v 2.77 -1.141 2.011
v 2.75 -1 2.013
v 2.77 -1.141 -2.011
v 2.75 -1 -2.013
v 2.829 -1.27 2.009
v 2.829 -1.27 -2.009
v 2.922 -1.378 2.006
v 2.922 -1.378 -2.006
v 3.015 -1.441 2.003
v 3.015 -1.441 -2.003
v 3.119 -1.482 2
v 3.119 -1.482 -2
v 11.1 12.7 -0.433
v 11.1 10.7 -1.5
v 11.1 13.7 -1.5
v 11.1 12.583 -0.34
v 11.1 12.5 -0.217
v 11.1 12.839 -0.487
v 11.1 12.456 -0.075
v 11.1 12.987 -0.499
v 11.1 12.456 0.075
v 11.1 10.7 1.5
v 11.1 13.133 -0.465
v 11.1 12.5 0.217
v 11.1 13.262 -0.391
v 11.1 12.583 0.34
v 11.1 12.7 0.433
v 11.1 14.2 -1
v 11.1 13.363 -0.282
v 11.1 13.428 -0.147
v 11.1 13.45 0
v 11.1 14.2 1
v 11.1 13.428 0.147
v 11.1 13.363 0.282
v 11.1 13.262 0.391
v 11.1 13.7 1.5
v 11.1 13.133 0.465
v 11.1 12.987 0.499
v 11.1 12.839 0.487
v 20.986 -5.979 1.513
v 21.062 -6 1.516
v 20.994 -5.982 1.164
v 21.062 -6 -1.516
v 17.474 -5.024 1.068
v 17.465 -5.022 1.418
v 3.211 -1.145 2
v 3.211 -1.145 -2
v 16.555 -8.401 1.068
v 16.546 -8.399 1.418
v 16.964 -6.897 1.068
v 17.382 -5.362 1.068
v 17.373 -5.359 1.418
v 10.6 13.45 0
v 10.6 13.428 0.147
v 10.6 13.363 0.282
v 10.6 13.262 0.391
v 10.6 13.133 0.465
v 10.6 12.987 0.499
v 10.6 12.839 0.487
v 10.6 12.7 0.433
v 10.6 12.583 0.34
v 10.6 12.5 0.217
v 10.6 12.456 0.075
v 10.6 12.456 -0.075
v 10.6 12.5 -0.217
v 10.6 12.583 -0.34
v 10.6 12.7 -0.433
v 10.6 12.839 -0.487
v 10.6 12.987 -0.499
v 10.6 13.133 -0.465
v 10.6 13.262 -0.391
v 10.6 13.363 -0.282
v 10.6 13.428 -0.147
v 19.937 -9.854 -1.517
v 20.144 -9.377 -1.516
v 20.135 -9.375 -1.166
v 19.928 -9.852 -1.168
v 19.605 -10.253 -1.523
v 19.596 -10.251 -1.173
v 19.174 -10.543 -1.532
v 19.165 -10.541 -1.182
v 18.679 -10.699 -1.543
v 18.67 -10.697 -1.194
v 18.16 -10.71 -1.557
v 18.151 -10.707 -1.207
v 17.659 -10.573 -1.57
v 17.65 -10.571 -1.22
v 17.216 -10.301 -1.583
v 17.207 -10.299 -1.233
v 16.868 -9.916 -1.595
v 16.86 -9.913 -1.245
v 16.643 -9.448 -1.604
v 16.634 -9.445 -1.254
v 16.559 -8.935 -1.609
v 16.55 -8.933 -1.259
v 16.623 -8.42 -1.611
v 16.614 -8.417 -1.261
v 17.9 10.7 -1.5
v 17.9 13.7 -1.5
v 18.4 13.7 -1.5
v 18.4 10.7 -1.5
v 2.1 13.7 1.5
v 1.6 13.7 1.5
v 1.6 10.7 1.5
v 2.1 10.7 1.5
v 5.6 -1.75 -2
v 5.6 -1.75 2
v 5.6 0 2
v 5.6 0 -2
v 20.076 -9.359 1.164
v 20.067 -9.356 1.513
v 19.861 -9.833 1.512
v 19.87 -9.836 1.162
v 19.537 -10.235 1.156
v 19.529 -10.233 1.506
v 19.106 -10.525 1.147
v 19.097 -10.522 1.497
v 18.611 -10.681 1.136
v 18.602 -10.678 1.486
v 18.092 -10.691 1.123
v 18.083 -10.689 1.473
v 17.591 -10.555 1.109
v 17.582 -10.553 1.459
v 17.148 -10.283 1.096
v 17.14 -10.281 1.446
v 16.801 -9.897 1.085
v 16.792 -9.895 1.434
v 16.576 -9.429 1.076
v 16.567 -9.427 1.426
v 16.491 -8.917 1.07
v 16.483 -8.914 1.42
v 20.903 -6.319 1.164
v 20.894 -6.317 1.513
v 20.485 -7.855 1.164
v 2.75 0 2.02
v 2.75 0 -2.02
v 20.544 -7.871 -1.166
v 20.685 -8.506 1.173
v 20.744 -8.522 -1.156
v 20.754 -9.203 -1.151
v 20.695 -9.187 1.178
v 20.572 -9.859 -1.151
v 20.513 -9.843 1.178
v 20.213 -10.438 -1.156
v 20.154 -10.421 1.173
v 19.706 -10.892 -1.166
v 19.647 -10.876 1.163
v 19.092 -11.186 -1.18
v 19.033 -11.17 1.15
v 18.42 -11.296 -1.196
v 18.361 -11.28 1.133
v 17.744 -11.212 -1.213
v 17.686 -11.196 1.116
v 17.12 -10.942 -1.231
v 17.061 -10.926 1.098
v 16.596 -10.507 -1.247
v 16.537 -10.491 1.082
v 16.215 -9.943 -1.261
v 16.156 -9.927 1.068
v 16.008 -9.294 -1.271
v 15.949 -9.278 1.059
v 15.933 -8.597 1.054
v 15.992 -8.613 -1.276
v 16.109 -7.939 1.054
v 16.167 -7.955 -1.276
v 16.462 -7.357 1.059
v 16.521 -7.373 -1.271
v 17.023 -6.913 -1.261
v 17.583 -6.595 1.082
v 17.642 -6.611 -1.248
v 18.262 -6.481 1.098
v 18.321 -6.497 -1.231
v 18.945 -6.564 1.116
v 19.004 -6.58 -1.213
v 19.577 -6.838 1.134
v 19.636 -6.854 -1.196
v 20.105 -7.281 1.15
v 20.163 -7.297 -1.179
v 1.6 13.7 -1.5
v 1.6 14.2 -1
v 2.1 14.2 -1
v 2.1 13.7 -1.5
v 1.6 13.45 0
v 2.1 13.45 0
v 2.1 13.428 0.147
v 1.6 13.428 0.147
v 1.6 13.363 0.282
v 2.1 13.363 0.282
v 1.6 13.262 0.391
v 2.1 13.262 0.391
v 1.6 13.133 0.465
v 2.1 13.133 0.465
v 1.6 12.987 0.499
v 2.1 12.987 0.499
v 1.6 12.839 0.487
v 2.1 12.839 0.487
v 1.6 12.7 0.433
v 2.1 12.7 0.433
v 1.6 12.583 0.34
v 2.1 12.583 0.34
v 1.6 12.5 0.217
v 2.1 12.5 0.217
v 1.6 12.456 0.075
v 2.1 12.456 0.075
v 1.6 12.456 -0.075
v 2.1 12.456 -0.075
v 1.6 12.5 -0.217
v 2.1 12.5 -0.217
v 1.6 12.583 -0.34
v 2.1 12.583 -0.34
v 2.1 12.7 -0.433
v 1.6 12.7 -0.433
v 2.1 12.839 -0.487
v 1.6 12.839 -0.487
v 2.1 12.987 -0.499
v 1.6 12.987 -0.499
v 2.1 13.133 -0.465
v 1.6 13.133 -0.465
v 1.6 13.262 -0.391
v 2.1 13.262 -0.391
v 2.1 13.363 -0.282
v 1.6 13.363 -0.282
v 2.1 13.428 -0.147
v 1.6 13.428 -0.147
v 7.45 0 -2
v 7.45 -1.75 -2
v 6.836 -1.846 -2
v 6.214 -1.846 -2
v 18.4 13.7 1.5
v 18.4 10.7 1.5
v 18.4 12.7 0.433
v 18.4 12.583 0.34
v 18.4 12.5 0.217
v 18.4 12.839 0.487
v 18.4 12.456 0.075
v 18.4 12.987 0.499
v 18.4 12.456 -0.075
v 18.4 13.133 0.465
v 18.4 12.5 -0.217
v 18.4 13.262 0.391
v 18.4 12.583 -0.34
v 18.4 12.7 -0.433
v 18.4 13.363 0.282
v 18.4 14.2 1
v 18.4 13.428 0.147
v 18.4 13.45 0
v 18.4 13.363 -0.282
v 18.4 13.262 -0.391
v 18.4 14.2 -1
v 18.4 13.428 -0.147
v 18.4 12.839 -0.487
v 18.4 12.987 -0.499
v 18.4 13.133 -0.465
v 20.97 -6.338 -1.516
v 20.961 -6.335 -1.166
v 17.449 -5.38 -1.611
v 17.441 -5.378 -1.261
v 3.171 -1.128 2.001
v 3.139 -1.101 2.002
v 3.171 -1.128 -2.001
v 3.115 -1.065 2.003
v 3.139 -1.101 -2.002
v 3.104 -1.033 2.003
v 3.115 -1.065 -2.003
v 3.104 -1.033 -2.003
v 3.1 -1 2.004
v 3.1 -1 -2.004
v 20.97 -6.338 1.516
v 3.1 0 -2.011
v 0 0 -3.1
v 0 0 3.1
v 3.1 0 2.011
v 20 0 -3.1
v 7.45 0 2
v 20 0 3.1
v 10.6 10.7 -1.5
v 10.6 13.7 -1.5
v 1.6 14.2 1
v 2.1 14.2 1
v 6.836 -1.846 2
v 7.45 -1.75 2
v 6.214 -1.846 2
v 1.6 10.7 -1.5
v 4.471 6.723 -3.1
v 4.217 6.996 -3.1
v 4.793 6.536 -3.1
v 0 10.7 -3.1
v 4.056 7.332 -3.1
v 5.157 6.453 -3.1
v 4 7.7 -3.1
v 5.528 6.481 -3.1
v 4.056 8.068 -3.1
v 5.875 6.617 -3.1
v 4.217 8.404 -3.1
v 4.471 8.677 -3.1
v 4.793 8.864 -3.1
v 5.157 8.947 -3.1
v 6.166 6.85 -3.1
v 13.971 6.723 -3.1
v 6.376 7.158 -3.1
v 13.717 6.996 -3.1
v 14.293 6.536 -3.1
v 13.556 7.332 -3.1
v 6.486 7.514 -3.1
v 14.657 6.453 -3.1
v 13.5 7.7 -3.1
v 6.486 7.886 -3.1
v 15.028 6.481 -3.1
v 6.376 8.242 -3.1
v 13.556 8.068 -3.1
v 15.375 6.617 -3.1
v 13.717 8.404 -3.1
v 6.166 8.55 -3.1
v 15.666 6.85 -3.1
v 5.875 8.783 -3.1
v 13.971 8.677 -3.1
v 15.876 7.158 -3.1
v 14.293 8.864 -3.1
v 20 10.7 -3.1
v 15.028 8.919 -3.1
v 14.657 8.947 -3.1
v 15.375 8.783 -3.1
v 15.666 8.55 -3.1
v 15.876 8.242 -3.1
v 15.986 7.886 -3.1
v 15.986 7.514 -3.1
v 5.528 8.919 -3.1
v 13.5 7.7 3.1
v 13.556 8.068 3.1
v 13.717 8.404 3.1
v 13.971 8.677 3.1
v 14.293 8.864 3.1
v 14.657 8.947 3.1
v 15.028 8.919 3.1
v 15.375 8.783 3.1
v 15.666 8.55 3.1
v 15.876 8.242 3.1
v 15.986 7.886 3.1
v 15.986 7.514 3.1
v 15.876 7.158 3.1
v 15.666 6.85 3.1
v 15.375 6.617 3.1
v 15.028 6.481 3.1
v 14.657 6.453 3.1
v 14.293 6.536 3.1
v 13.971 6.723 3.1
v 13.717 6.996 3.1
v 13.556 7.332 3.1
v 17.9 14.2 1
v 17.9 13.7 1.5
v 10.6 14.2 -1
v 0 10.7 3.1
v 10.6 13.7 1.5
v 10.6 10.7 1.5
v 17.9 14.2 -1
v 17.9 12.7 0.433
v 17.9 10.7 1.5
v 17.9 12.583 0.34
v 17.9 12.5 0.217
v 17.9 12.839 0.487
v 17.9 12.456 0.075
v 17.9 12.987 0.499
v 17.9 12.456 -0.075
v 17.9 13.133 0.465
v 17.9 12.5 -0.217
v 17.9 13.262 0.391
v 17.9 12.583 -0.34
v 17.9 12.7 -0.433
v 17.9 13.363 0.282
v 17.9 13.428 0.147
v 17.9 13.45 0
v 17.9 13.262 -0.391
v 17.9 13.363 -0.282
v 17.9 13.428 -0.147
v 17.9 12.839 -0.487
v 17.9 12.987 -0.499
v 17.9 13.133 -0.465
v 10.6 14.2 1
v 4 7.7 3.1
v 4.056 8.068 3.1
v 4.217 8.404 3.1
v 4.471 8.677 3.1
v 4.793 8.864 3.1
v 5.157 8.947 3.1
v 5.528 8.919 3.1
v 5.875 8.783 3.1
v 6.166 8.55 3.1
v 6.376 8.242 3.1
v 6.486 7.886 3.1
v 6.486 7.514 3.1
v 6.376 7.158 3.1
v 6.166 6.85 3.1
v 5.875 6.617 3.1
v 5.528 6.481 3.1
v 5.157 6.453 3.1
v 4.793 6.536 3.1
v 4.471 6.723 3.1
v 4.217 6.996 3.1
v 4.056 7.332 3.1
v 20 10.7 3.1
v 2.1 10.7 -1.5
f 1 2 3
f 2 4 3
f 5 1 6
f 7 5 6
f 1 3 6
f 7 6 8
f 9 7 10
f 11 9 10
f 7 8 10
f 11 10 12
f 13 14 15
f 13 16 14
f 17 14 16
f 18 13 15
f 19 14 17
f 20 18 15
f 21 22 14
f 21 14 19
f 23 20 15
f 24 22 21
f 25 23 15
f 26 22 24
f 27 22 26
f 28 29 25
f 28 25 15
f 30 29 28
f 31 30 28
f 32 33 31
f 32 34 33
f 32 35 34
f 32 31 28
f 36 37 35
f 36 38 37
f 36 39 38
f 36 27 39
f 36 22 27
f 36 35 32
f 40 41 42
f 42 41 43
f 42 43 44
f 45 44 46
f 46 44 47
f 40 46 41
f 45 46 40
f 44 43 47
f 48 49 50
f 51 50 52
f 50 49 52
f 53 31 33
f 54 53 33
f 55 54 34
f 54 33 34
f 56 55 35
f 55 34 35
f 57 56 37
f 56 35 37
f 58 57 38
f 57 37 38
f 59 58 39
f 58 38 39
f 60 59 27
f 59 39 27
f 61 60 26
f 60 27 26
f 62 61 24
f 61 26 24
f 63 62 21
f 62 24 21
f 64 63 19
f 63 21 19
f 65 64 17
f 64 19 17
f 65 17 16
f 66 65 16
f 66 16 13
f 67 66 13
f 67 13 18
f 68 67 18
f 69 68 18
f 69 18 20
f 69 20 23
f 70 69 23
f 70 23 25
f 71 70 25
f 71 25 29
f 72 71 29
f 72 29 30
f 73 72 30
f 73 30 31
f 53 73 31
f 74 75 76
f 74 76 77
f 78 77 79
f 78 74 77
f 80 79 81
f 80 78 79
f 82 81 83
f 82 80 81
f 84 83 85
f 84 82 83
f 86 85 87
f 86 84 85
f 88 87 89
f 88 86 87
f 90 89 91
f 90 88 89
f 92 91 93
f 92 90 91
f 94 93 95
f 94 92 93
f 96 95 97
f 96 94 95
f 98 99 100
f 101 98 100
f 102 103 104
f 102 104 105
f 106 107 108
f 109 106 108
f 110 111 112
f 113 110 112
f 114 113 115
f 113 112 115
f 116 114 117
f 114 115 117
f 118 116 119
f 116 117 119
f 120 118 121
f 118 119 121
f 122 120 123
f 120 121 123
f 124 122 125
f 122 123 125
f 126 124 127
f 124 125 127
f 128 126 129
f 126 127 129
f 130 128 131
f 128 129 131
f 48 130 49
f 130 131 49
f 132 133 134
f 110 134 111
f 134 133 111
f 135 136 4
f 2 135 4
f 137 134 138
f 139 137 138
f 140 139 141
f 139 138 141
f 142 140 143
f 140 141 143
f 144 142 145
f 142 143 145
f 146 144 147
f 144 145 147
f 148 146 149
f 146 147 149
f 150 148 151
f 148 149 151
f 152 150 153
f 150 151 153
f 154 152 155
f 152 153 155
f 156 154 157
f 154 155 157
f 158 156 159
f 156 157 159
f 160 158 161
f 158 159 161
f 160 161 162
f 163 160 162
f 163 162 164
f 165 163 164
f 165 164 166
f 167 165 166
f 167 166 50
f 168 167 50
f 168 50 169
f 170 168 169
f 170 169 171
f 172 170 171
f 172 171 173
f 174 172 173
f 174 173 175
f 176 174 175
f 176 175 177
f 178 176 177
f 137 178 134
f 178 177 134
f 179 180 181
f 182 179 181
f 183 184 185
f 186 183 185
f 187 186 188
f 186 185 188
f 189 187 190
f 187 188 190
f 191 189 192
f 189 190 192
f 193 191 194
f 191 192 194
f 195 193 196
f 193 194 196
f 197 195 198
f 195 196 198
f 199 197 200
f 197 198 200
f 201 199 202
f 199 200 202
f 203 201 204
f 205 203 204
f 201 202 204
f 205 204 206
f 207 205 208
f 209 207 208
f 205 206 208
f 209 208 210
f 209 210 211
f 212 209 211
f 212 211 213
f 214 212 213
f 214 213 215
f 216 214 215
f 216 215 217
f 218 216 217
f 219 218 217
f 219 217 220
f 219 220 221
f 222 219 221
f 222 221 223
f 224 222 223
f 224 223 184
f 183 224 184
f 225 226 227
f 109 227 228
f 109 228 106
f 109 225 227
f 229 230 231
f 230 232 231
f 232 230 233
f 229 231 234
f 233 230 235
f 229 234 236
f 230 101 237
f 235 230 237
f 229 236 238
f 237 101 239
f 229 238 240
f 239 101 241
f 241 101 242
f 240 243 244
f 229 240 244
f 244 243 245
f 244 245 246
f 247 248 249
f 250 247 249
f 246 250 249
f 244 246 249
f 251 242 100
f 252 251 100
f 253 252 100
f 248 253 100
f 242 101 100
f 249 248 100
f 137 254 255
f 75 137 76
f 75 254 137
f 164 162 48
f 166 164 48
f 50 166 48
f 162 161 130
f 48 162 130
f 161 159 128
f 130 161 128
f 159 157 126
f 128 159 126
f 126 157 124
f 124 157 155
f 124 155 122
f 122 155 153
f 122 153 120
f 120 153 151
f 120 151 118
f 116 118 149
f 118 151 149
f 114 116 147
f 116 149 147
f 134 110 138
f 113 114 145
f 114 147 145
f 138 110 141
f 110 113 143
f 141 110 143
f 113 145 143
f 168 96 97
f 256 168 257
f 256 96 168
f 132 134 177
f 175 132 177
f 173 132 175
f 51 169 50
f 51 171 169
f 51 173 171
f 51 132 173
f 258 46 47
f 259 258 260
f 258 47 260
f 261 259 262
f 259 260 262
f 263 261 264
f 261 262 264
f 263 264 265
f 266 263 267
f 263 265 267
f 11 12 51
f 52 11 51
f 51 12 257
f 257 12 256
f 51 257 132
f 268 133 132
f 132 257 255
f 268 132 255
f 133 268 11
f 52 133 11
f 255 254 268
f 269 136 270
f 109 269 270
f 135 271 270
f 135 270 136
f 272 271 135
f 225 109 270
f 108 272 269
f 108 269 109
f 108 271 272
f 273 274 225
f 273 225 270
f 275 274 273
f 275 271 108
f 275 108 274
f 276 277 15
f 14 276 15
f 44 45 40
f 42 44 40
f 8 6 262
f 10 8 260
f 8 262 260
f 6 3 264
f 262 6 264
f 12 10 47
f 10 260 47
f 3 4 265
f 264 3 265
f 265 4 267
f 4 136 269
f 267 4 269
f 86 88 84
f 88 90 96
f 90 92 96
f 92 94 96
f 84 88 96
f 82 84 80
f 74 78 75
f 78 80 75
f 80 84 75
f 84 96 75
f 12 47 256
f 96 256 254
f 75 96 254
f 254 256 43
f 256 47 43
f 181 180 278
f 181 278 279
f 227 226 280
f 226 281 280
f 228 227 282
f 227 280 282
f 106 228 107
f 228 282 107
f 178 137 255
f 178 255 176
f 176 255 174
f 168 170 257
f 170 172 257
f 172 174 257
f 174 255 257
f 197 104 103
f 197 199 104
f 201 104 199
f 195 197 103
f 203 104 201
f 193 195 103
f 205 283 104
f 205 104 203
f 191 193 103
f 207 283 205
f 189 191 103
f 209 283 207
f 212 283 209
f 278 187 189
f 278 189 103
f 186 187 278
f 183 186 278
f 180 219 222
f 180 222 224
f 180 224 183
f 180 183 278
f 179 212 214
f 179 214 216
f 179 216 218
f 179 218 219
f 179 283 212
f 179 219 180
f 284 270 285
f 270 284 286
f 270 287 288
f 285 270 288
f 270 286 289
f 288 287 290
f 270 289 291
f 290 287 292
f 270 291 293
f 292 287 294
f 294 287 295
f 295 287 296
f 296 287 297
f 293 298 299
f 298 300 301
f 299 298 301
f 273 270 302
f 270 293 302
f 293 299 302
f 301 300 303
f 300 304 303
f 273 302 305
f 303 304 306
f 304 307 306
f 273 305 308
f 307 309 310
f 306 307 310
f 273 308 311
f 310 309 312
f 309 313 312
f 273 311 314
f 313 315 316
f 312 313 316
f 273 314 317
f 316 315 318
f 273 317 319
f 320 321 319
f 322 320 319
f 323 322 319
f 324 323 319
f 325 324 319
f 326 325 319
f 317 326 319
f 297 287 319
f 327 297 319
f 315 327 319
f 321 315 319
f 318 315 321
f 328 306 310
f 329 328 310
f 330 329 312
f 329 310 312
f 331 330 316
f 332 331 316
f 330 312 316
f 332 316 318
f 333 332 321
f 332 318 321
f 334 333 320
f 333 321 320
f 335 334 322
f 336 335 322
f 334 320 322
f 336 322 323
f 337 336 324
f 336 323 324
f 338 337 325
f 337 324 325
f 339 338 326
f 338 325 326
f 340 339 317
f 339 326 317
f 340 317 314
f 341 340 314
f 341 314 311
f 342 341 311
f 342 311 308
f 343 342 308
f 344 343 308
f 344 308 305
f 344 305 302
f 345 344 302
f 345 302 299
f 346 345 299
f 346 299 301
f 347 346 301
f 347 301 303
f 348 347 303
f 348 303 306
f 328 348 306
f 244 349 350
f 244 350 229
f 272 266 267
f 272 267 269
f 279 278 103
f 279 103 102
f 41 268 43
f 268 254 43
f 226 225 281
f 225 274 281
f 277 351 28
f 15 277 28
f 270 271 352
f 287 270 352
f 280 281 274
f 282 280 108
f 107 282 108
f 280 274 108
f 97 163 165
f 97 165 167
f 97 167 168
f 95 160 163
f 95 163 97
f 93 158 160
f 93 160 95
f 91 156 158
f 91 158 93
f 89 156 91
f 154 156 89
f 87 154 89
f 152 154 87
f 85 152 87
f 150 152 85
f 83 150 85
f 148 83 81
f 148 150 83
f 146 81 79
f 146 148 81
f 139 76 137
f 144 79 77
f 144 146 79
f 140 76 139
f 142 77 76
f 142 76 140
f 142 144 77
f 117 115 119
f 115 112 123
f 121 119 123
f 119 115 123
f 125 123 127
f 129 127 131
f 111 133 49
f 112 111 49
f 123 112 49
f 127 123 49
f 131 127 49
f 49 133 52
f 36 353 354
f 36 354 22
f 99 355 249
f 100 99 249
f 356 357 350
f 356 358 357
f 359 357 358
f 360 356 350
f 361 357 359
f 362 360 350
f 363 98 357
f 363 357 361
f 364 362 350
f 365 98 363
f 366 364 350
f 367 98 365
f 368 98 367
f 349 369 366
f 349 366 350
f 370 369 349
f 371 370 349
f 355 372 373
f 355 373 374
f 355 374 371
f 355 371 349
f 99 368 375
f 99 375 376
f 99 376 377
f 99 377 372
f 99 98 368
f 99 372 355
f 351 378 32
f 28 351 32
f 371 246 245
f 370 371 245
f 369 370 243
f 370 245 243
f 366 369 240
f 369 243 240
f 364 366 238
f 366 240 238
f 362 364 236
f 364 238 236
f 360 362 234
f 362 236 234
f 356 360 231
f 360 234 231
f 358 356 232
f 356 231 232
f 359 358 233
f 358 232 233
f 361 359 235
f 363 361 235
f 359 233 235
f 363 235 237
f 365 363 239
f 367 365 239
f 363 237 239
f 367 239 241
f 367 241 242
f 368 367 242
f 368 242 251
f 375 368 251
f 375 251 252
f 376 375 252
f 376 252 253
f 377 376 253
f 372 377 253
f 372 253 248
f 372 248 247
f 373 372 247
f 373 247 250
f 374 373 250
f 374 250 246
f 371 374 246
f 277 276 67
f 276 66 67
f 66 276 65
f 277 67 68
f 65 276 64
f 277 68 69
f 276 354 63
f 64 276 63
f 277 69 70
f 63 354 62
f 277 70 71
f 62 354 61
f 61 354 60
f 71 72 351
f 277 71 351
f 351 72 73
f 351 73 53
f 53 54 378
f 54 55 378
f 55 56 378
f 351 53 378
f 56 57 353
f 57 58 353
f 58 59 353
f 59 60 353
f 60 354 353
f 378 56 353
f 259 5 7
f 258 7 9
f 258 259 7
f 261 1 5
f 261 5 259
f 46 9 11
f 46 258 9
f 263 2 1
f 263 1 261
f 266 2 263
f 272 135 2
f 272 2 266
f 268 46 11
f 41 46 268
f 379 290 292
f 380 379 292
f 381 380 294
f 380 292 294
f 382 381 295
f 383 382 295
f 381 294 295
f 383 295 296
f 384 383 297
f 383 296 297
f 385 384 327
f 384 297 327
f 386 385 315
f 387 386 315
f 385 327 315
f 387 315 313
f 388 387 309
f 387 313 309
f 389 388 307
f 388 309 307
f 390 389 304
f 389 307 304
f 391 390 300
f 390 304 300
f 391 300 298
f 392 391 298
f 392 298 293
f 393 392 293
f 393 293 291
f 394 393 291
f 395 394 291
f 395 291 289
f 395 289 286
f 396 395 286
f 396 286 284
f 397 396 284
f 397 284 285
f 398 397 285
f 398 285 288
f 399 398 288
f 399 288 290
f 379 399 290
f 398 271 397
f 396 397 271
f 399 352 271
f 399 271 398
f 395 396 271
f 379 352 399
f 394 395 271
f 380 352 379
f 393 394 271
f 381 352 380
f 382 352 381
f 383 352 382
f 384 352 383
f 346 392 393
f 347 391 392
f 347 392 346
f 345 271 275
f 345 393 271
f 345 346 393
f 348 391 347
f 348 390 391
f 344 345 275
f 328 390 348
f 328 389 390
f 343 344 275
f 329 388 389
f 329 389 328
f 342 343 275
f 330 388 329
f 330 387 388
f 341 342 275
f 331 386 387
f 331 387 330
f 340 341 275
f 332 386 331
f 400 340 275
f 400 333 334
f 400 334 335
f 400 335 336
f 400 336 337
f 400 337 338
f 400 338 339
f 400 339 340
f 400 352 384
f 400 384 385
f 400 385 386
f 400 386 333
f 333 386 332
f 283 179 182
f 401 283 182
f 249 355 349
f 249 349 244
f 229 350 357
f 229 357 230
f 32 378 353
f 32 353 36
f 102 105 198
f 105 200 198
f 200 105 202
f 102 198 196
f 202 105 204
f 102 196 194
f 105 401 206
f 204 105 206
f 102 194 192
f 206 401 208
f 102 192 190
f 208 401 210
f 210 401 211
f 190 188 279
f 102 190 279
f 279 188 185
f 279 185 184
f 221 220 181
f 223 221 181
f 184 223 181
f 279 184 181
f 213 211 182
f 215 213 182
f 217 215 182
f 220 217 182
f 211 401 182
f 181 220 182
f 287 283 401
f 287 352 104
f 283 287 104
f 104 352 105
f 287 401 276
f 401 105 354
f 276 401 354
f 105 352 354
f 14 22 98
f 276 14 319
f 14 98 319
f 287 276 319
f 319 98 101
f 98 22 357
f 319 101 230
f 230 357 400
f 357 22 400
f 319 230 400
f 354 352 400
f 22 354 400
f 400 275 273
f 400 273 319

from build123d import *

# Parameters (mm, degrees)
SKETCH1_W           = 20
SKETCH1_H           = 10.7
BOSS_EXTRUDE1_DEPTH = 3.1
SKETCH2_W           = 0.5
SKETCH2_H           = 3.5
BOSS_EXTRUDE2_DEPTH = 1.5
CHAMFER1_SIZE       = 0.5
CUT_EXTRUDE1_REACH  = 25.448
SKETCH3_R           = 0.5
SKETCH4_R           = 1.25
CUT_EXTRUDE2_DEPTH  = 26.299802371
BOSS_EXTRUDE3_DEPTH = 2
DRAFT10_ANGLE       = 1.5
BOSS_EXTRUDE4_DEPTH = 0.35
SKETCH8_R           = 2.4
BOSS_EXTRUDE5_DEPTH = 2.330082213


with BuildPart() as part:
    # Sketch1 → Boss-Extrude1 (new, symmetric)
    with BuildSketch(Plane.XY):
        with Locations((10, 5.35)):
            Rectangle(SKETCH1_W, SKETCH1_H)
    extrude(amount=BOSS_EXTRUDE1_DEPTH, both=True)

    # Sketch2 → Boss-Extrude2 (add, symmetric)
    with BuildSketch(Plane.XY):
        with Locations((1.85, 12.45)):
            Rectangle(SKETCH2_W, SKETCH2_H)
        with Locations((18.15, 12.45)):
            Rectangle(SKETCH2_W, SKETCH2_H)
        with Locations((10.85, 12.45)):
            Rectangle(SKETCH2_W, SKETCH2_H)
    extrude(amount=BOSS_EXTRUDE2_DEPTH, both=True)

    # Chamfer1
    chamfer1_edges = [part.edges().sort_by_distance(p)[0] for p in [
        (1.85, 14.2, -1.5),
        (1.85, 14.2, 1.5),
        (18.15, 14.2, -1.5),
        (18.15, 14.2, 1.5),
        (10.85, 14.2, -1.5),
        (10.85, 14.2, 1.5),
    ]]
    chamfer(chamfer1_edges, length=CHAMFER1_SIZE)

    # Cut-Extrude1: up to this face of the body (flat: up to its plane)
    cut_extrude1_end = Plane(part.part.faces().sort_by_distance((1.6, 12.411382114, 0))[0])
    # Sketch3 → Cut-Extrude1 (cut, up to the picked face)
    with BuildSketch(Plane(origin=(18.4, 0, 0), x_dir=(0, 0, -1), z_dir=(1, 0, 0)), mode=Mode.PRIVATE) as cut_extrude1_sk1:
        with Locations(Location((0, 12.95, 0), (0, 0, 90))):
            Circle(SKETCH3_R)
    cut_extrude1_tool1 = split(extrude(cut_extrude1_sk1.sketch, amount=-CUT_EXTRUDE1_REACH, mode=Mode.PRIVATE), bisect_by=cut_extrude1_end, keep=Keep.BOTH, mode=Mode.PRIVATE)
    add(cut_extrude1_tool1.solids().sort_by(Axis((18.4, 12.95, 0), (-1, 0, 0)))[0], mode=Mode.SUBTRACT)

    # Sketch4 → Cut-Extrude2 (cut, through all)
    with BuildSketch(Plane(origin=(0, 0, -3.1), x_dir=(-1, 0, 0), z_dir=(0, 0, -1))):
        with Locations((-5.25, 7.7)):
            Circle(SKETCH4_R)
        with Locations((-14.75, 7.7)):
            Circle(SKETCH4_R)
    extrude(amount=-CUT_EXTRUDE2_DEPTH, mode=Mode.SUBTRACT)

    # Sketch5 → Boss-Extrude3 (add, symmetric)
    with BuildSketch(Plane.XY):
        with BuildLine():
            Line((2.75, 0), (2.75, -1))
            ThreePointArc((2.75, -1), (2.852752222, -1.303634983), (3.11877681, -1.482473289))
            Line((3.11877681, -1.482473289), (20.970288501, -6.337731302))
            Line((20.970288501, -6.337731302), (21.062144733, -6))
            Line((21.062144733, -6), (3.210633043, -1.144741987))
            ThreePointArc((3.210633043, -1.144741987), (3.130825667, -1.091090495), (3.1, -1))
            Line((3.1, -1), (3.1, 0))
            Line((3.1, 0), (2.75, 0))
        make_face()
        with BuildLine():
            Line((5.6, 0), (7.45, 0))
            Line((7.45, 0), (7.45, -1.75))
            ThreePointArc((7.45, -1.75), (6.525, -1.858422556), (5.6, -1.75))
            Line((5.6, -1.75), (5.6, 0))
        make_face()
    extrude(amount=BOSS_EXTRUDE3_DEPTH, both=True)

    # Draft10
    draft10_faces = [part.faces().sort_by_distance(p)[0] for p in [
        (11.436613636, -3.524482983, -2),
        (11.436613636, -3.524482983, 2),
    ]]
    draft(draft10_faces, Plane(origin=(3.279392904, -0.891929992, 0), x_dir=(0.26244637909853513, 0.9649465778467056, 0), z_dir=(0.9649465778467056, -0.26244637909853513, 0)), DRAFT10_ANGLE)

    # Sketch7 → Boss-Extrude4 (add)
    with BuildSketch(Plane(origin=(0.052748549, -0.014346562, -2.087562004), x_dir=(-0.9996809315410219, -0.0001699850736862716, -0.02525878497374093), z_dir=(0.02525935668815235, -0.006870045299250848, -0.9996573249755574))):
        with BuildLine():
            Line((-17.494148049, -5.03114496), (-21.016123341, -5.989367295))
            Line((-21.016123341, -5.989367295), (-20.097280006, -9.366603877))
            ThreePointArc((-20.097280006, -9.366603877), (-17.857181192, -10.648480355), (-16.575304714, -8.408381541))
            Line((-16.575304714, -8.408381541), (-17.494148049, -5.03114496))
        make_face()
    boss_extrude4 = extrude(amount=-BOSS_EXTRUDE4_DEPTH)

    # Mirror1: Boss-Extrude4 across plane
    add(boss_extrude4.mirror(Plane(origin=(0.014479585, -0.003938161, -0.573040064), x_dir=(0.9996809315475117, 0.00017358831123137617, 0.02525876021101414), z_dir=(0.02525935668815235, -0.006870045299250846, -0.9996573249755574))))

    # Sketch8 → Boss-Extrude5 (add)
    with BuildSketch(Plane(origin=(-0.014948604, 0.004065724, 0.591601811), x_dir=(-0.9996809315475117, -0.00017358831123137592, -0.025258760211014114), z_dir=(0.02525935668815233, -0.00687004529925084, -0.9996573249755573))):
        with Locations(Location((-18.336260335, -8.88755878, 0), (0, 0, 154.72118915))):
            Circle(SKETCH8_R)
    extrude(amount=BOSS_EXTRUDE5_DEPTH)


solid = part.part
